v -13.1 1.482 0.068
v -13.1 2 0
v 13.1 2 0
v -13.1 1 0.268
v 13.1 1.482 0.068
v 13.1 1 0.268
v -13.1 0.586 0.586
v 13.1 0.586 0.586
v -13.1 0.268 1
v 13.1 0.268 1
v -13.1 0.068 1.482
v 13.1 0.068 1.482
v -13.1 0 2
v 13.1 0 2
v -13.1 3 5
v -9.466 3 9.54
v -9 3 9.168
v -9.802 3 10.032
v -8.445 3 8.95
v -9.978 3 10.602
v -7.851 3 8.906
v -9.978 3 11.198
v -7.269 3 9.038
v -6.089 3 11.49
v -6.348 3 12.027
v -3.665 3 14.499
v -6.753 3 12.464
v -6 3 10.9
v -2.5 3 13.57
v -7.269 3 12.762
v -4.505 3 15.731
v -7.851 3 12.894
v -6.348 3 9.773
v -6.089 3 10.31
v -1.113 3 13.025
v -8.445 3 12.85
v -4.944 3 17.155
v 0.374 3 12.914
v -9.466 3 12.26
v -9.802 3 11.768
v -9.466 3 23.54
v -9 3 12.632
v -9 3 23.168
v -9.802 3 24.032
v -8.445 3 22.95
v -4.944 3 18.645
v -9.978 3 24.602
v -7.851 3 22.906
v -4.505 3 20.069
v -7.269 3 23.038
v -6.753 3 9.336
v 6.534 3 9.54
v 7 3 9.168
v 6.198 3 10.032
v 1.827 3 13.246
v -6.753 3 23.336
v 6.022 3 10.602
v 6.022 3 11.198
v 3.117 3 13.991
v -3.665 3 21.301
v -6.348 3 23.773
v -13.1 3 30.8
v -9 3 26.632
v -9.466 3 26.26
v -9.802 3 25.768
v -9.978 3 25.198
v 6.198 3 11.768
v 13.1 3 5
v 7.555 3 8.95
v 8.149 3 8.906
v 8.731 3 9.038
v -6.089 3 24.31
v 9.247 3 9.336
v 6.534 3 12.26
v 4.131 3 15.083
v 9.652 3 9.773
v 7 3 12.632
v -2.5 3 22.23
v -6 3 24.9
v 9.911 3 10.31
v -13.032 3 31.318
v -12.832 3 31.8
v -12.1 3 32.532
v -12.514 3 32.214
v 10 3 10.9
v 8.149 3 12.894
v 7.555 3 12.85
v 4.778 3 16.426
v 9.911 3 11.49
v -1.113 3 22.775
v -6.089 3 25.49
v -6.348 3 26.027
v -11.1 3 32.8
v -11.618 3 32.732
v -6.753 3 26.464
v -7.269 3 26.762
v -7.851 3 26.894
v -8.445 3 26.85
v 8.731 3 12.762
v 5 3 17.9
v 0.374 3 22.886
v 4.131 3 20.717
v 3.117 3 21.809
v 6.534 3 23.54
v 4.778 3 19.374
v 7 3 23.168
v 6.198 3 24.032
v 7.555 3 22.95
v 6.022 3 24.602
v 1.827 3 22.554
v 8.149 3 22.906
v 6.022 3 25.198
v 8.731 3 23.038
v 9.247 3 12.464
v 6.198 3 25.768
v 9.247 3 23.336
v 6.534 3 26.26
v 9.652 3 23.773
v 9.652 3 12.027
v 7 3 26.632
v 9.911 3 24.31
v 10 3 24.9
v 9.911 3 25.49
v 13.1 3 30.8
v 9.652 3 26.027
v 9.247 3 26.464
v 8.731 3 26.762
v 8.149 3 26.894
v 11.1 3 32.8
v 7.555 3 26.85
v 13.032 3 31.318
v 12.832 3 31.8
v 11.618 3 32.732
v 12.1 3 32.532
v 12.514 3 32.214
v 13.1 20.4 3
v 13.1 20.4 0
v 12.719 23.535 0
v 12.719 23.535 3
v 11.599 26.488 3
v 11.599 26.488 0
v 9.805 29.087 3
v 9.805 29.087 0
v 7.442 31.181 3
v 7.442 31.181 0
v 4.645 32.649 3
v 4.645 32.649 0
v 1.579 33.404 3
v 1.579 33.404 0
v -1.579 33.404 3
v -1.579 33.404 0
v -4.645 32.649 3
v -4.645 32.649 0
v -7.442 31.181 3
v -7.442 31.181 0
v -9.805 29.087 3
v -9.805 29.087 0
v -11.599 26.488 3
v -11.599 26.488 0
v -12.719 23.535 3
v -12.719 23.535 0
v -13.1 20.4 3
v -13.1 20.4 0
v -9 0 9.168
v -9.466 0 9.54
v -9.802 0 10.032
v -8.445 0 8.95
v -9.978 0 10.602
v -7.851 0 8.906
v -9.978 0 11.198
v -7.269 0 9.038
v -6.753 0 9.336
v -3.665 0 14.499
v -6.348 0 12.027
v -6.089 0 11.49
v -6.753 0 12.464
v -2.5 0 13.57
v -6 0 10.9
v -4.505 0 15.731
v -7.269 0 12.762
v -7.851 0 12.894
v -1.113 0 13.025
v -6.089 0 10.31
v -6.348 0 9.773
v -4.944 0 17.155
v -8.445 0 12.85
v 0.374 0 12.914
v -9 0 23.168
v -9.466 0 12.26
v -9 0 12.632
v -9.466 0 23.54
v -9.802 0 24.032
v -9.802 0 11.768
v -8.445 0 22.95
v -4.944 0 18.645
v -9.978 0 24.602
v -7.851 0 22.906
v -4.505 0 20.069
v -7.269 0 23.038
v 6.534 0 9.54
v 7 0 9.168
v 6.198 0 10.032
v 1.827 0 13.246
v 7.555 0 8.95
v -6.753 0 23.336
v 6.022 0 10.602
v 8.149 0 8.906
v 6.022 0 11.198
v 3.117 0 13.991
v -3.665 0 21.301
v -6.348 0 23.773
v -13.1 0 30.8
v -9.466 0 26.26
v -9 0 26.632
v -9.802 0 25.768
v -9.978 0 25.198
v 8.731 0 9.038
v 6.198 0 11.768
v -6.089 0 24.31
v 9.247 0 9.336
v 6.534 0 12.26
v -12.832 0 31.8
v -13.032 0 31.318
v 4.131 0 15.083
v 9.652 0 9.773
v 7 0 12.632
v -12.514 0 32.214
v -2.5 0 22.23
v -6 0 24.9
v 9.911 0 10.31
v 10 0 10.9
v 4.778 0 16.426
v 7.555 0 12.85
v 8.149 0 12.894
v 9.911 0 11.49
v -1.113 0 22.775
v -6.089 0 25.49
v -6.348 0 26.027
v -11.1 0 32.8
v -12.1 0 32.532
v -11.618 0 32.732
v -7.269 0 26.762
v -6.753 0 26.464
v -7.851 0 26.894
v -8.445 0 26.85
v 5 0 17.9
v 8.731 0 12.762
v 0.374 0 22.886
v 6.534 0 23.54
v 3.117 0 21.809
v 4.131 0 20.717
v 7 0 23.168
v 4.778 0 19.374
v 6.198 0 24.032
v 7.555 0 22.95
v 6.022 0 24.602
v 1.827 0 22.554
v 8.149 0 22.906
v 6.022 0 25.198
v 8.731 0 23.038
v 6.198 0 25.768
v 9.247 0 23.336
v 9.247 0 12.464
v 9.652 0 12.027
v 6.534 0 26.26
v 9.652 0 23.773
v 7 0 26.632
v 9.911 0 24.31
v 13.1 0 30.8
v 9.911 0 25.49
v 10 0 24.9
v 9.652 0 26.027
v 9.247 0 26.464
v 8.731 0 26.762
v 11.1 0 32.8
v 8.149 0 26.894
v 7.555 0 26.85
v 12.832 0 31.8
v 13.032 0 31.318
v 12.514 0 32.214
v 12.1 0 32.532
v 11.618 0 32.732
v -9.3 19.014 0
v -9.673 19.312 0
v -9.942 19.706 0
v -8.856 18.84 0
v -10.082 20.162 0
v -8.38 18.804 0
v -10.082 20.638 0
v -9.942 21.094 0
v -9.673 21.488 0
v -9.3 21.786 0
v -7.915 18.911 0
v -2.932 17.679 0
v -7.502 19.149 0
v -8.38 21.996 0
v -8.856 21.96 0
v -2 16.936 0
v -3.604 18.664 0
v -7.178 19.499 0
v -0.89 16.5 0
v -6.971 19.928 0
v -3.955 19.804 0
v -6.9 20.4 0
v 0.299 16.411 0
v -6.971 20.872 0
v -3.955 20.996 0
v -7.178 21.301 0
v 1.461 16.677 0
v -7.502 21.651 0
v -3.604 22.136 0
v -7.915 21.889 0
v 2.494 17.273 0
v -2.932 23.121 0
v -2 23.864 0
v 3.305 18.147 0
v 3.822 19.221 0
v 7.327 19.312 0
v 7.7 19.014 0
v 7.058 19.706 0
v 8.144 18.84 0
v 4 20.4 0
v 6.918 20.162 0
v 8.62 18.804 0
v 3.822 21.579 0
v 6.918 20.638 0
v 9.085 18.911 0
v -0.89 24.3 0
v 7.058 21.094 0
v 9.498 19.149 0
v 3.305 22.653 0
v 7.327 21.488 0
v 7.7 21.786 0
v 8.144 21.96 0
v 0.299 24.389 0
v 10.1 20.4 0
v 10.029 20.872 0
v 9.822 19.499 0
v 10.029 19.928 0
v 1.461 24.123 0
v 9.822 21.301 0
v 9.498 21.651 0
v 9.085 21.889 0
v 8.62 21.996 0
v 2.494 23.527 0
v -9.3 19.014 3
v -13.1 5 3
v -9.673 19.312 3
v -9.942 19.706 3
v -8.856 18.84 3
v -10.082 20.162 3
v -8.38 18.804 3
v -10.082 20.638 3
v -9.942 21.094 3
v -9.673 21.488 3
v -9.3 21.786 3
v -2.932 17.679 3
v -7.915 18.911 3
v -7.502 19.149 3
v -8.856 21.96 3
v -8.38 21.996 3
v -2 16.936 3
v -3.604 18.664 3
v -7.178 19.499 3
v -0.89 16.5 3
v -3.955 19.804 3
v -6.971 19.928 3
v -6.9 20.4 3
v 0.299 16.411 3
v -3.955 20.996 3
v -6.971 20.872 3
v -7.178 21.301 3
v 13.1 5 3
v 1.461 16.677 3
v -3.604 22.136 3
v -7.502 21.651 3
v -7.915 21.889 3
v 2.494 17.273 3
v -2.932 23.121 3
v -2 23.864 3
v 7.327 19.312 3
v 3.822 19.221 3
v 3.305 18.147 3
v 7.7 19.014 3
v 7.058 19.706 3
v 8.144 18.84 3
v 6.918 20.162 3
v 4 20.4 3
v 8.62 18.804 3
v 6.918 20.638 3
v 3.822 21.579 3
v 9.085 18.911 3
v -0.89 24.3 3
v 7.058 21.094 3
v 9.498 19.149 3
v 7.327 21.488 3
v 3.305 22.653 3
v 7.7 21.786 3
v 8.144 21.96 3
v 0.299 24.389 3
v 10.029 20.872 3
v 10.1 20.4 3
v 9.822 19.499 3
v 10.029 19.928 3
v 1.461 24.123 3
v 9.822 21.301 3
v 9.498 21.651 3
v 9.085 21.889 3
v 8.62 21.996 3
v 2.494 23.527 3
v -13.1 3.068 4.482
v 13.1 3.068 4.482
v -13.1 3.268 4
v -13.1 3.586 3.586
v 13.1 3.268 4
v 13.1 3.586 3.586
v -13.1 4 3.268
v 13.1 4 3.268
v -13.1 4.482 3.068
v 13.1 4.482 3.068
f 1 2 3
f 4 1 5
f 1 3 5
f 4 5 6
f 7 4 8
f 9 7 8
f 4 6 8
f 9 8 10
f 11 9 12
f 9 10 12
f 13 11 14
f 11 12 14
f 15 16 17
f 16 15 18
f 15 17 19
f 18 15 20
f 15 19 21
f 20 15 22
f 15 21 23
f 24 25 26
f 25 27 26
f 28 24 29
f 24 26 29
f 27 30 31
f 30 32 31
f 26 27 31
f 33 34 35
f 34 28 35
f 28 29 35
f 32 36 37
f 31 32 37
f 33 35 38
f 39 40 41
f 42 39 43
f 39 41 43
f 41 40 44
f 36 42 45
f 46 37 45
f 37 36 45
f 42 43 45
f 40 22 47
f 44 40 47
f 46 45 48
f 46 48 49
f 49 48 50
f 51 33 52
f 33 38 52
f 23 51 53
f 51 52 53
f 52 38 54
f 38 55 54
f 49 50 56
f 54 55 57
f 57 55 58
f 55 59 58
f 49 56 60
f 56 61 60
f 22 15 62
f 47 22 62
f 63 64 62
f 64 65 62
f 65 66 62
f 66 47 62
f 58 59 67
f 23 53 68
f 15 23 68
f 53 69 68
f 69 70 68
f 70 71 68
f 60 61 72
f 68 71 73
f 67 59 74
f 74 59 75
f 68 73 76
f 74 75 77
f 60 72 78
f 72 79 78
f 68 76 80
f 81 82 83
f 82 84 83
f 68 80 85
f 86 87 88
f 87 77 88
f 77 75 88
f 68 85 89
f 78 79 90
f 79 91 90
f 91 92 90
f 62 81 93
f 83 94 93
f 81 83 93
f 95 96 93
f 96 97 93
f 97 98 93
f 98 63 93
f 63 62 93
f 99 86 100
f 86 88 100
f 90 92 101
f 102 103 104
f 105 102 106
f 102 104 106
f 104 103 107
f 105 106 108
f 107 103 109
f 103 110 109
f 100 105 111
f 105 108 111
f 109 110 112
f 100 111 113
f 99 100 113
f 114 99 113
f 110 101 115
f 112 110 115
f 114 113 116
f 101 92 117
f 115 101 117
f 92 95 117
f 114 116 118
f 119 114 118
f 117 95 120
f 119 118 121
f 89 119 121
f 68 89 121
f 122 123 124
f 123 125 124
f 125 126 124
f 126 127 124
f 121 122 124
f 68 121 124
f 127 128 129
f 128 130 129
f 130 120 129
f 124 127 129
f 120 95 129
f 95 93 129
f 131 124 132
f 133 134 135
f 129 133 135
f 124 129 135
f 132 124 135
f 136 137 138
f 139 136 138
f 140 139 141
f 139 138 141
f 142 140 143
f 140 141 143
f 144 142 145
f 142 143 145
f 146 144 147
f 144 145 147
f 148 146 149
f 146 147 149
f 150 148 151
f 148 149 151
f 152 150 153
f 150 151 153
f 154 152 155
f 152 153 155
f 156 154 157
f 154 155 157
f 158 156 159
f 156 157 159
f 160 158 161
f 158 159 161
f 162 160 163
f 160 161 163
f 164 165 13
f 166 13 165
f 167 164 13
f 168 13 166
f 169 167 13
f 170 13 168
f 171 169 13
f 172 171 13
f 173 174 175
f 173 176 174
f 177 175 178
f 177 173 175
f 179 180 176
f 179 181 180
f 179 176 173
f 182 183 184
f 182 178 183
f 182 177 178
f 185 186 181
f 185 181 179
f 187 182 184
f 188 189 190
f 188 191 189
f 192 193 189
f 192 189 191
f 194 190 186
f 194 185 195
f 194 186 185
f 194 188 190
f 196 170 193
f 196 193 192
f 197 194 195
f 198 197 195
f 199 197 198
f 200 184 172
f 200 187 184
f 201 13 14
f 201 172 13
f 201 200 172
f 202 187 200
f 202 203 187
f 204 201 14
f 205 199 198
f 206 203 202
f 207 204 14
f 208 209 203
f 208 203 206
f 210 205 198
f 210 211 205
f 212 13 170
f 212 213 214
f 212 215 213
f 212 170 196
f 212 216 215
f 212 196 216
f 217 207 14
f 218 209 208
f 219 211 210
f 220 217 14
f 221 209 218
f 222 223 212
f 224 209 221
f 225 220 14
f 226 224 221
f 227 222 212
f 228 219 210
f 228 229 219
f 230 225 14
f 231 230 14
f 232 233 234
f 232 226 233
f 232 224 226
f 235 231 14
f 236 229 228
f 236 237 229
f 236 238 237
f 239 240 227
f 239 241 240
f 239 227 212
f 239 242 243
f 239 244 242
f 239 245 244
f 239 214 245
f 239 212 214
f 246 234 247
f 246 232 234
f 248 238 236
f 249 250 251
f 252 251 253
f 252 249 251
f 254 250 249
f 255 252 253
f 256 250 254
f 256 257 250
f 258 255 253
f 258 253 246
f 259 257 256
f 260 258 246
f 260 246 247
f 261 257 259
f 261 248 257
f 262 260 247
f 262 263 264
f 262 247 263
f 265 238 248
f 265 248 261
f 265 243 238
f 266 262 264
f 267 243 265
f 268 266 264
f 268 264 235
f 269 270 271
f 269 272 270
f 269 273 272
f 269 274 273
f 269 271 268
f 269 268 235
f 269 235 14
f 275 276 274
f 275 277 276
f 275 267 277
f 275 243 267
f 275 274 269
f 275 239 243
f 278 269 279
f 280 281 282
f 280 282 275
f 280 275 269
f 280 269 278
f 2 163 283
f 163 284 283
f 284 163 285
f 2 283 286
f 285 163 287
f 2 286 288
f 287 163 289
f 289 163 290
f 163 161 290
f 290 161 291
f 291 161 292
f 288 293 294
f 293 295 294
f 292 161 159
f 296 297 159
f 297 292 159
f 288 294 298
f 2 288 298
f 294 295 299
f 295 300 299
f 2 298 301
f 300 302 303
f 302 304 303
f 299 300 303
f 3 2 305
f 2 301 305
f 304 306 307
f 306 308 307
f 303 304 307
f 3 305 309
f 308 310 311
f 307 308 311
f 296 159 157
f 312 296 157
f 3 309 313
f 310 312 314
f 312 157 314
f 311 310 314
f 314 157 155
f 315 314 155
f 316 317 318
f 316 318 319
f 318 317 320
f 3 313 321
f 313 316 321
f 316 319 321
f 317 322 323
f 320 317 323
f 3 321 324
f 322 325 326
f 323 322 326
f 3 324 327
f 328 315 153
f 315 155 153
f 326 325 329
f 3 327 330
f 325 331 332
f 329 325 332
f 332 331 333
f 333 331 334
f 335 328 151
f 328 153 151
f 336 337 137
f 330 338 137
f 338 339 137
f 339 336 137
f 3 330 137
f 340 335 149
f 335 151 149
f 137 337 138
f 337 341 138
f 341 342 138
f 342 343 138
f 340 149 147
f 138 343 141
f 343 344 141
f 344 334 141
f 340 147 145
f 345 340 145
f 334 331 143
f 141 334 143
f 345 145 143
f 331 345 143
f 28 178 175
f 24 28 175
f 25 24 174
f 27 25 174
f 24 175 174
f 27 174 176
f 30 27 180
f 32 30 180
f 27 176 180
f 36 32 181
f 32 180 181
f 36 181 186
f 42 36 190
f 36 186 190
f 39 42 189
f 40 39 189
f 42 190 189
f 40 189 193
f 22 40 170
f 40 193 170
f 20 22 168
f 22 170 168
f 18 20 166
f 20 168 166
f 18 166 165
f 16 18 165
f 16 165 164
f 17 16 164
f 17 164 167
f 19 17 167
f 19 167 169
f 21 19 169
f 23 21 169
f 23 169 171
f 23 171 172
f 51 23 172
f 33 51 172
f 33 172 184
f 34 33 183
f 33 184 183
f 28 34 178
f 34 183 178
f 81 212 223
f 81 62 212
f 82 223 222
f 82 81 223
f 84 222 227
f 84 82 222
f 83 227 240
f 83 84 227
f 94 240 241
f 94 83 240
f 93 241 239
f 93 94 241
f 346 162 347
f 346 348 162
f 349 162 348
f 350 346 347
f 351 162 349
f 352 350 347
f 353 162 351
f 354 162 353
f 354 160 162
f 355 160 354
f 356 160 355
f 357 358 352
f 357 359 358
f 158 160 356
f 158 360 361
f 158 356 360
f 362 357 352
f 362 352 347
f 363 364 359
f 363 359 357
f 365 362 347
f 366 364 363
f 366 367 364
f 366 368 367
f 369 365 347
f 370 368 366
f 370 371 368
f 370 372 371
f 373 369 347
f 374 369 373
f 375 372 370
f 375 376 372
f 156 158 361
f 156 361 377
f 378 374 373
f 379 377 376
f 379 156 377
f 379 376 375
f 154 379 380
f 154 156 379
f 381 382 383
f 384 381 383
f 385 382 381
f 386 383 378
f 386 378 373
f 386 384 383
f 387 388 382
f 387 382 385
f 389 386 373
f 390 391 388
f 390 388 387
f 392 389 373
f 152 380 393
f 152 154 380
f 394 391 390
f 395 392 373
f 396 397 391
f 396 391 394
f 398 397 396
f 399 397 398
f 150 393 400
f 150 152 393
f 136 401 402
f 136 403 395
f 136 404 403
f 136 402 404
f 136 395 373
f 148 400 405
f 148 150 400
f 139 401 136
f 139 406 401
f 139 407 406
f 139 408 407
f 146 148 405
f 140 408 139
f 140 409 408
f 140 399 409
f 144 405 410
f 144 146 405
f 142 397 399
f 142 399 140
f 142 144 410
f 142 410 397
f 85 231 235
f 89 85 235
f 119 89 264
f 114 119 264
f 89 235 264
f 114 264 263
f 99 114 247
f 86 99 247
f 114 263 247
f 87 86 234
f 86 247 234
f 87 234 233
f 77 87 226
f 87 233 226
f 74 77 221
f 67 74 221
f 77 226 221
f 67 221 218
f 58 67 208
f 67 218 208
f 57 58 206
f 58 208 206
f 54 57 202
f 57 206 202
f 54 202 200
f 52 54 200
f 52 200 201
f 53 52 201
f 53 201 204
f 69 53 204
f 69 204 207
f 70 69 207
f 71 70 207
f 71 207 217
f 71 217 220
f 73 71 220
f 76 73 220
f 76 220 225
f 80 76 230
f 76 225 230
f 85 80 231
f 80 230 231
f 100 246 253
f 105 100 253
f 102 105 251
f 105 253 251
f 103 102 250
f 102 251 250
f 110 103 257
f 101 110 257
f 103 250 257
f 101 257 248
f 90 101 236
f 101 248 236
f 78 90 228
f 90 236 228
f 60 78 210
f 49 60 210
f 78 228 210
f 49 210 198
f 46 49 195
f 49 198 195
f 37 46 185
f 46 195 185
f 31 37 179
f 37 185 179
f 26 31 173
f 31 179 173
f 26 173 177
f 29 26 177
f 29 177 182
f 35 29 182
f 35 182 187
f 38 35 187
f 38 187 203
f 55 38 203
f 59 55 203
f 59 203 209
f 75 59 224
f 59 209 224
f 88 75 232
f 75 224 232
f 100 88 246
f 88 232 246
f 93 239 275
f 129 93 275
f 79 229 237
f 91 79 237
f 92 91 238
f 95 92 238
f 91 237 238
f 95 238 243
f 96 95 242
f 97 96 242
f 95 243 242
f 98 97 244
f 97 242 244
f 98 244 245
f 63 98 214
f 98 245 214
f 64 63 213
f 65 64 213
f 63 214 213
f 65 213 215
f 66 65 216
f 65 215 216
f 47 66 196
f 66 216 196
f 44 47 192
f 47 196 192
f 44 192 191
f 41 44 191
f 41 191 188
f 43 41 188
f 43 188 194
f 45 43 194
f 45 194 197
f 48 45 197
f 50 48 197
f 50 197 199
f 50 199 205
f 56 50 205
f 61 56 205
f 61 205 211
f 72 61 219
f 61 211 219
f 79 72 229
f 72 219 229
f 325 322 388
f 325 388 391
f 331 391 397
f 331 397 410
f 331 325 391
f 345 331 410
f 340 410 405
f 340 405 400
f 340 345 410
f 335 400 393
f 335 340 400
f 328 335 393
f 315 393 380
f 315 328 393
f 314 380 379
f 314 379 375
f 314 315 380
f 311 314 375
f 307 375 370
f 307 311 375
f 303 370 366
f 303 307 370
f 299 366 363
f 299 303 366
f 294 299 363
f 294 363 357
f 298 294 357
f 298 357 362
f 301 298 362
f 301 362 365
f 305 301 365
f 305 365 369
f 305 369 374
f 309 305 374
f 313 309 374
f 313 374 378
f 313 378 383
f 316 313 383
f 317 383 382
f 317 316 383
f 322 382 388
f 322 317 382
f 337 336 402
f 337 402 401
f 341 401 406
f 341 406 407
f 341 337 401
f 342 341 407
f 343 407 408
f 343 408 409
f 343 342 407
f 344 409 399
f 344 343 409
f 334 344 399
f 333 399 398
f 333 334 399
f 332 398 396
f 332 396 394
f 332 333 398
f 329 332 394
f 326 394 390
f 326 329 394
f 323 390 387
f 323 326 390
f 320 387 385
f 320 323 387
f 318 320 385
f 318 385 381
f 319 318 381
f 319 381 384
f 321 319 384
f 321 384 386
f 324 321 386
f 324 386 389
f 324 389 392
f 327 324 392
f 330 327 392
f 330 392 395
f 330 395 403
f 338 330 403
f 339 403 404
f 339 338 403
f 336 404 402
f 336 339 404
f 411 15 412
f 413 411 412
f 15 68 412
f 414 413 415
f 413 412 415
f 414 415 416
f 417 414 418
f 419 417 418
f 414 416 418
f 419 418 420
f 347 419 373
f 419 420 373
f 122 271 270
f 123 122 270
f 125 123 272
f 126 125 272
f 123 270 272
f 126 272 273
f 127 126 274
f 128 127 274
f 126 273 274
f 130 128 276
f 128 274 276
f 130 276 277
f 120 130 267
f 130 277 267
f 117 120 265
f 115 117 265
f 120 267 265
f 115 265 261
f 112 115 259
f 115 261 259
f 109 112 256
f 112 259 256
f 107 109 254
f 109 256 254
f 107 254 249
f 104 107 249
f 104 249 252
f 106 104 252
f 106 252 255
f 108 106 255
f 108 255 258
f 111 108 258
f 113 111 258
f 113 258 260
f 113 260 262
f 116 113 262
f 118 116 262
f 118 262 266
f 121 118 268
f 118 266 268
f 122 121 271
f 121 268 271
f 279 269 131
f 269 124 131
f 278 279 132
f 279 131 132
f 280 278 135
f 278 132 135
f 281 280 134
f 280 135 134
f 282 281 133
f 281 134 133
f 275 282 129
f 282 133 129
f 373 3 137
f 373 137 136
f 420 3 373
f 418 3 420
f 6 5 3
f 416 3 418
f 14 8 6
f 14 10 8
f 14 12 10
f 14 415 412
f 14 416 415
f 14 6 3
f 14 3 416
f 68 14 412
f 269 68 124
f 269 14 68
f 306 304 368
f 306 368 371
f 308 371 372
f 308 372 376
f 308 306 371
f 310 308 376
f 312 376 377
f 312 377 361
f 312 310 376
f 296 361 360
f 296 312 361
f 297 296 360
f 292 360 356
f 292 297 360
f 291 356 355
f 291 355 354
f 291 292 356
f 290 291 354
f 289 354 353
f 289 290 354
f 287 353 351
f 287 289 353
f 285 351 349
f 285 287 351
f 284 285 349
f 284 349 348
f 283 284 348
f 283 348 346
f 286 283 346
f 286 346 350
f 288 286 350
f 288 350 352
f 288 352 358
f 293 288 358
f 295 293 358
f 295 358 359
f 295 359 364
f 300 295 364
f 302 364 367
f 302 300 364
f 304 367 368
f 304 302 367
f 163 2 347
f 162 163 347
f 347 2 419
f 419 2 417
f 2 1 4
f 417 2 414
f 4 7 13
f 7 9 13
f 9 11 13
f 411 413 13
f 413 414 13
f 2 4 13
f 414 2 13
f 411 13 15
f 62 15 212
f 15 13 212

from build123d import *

# Parameters (mm, degrees)
SKETCH1_R           = 4
SKETCH1_R_2         = 1.6
BOSS_EXTRUDE1_DEPTH = 3
SKETCH2_W           = 26.2
SKETCH2_H           = 29.8
SKETCH2_R           = 2
SKETCH2_R_2         = 5
BOSS_EXTRUDE2_DEPTH = 3
FILLET1_R           = 2


with BuildPart() as part:
    # Sketch1 → Boss-Extrude1 (new body)
    with BuildSketch(Plane.XY):
        with BuildLine():
            Line((-13.1, 20.4), (-13.1, 0))
            Line((-13.1, 0), (13.1, 0))
            Line((13.1, 0), (13.1, 20.4))
            ThreePointArc((13.1, 20.4), (0, 33.5), (-13.1, 20.4))
        make_face()
        with Locations((0, 20.4)):
            Circle(SKETCH1_R, mode=Mode.SUBTRACT)
        with Locations((-8.5, 20.4)):
            Circle(SKETCH1_R_2, mode=Mode.SUBTRACT)
        with Locations((8.5, 20.4)):
            Circle(SKETCH1_R_2, mode=Mode.SUBTRACT)
    extrude(amount=BOSS_EXTRUDE1_DEPTH)

    # Sketch2 → Boss-Extrude2 (add)
    with BuildSketch(Plane.XZ):
        with Locations((0, 17.9)):
            Rectangle(SKETCH2_W, SKETCH2_H)
        with Locations((8, 24.9)):
            Circle(SKETCH2_R, mode=Mode.SUBTRACT)
        with Locations((8, 10.9)):
            Circle(SKETCH2_R, mode=Mode.SUBTRACT)
        with Locations((-8, 10.9)):
            Circle(SKETCH2_R, mode=Mode.SUBTRACT)
        with Locations((-8, 24.9)):
            Circle(SKETCH2_R, mode=Mode.SUBTRACT)
        with Locations((0, 17.9)):
            Circle(SKETCH2_R_2, mode=Mode.SUBTRACT)
    extrude(amount=-BOSS_EXTRUDE2_DEPTH)

    # Fillet1
    fillet1_edges = [part.edges().sort_by_distance(p)[0] for p in [
        (13.1, 1.5, 32.8),
        (0, 3, 3),
        (-13.1, 1.5, 32.8),
        (0, 0, 0),
    ]]
    fillet(fillet1_edges, radius=FILLET1_R)


solid = part.part
